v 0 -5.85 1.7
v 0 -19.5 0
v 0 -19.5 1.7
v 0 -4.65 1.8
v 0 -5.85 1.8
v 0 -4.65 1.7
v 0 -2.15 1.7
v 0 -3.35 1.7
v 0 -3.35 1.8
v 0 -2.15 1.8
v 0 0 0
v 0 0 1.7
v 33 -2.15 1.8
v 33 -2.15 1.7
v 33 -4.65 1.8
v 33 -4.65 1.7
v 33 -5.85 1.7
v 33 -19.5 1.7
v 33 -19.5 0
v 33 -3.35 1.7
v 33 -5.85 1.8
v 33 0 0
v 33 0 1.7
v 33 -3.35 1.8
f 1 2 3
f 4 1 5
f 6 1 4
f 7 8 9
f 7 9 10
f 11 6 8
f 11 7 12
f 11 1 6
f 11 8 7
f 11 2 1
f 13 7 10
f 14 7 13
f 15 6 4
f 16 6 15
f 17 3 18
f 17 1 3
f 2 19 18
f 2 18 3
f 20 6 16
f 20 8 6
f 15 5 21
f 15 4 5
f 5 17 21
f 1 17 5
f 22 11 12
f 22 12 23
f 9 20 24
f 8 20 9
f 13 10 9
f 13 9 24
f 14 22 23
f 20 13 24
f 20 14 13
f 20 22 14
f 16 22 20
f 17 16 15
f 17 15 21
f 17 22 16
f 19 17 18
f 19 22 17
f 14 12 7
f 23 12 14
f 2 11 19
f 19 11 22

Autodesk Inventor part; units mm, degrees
ref_plane "YZ Plane" through (0, 0, 0) normal (1, 0, 0) x (0, 1, 0)
ref_plane "XZ Plane" through (0, 0, 0) normal (0, 1, 0) x (-1, 0, 0)
ref_plane "XY Plane" through (0, 0, 0) normal (0, 0, 1) x (1, 0, 0)
sketch "Skizze1" plane through (0, 0, 0) normal (0, 0, 1) x (1, 0, 0)
  line L0 (0, 0) -> (33, 0)
  line L1 (33, 0) -> (33, -19.5)
  line L2 (33, -19.5) -> (0, -19.5)
  line L3 (0, -19.5) -> (0, 0)
  dimension "d0" = 33
  dimension "d1" = 19.5
extrude "Extrusion1" add sketch "Skizze1" along normal blind 1.7
sketch "Skizze2" plane through (0, 0, 1.7) normal (0, 0, 1) x (1, 0, 0)
  line L0 (33, 0) -> (0, 0) projected
  line L1 (0, 0) -> (0, -19.5) projected
  line L2 (0, -19.5) -> (33, -19.5) projected
  line L3 (33, -19.5) -> (33, 0) projected
  line L4 (0, 0) -> (0, -19.5) projected
  line L5 (33, 0) -> (33, -19.5) projected
  line L6 (0, -2.15) -> (33, -2.15)
  line L7 (33, -2.15) -> (33, -3.35)
  line L8 (33, -3.35) -> (0, -3.35)
  line L9 (0, -3.35) -> (0, -2.15)
  line L10 (33, -5.85) -> (0, -5.85)
  line L11 (0, -5.85) -> (0, -4.65)
  line L12 (0, -4.65) -> (33, -4.65)
  line L13 (33, -4.65) -> (33, -5.85)
  line L14 (0, -3.35) -> (33, -3.35)
  line L15 (33, -3.35) -> (33, -2.15)
  line L16 (33, -2.15) -> (0, -2.15)
  line L17 (0, -2.15) -> (0, -3.35)
  line L18 (33, -4.65) -> (0, -4.65)
  line L19 (0, -4.65) -> (0, -5.85)
  line L20 (0, -5.85) -> (33, -5.85)
  line L21 (33, -5.85) -> (33, -4.65)
  dimension "d10" = 1.2
  dimension "d11" = 1.2
  dimension "d12" = 1.3
extrude "Extrusion2" add sketch "Skizze2" along normal blind 0.1 contours L3 L8 L1 L6 | L3 L10 L1 L12
sketch "Skizze4" plane through (0, 0, 1.7) normal (0, 0, 1) x (1, 0, 0)
  line L0 (429, -5.85) -> (0, -5.85) projected
  line L1 (0, -5.85) -> (0, -20) projected
  line L2 (0, -20) -> (429, -20) projected
  line L3 (429, -20) -> (429, -5.85) projected
  line L4 (0, -20) -> (-50, -20)
  line L5 (-50, -20) -> (-50, 20)
  line L6 (-50, 20) -> (0, 20)
  line L7 (0, 20) -> (0, -20)
  line L8 (23.5, 20) -> (11.5, 20) projected
  point P0 (0, 0)
  dimension "d19" = 50
sketch "Skizze5" plane through (0, 0, 1.7) normal (0, 0, 1) x (1, 0, 0)
  circle A0 centre (50.5, 14) radius 1.5 projected
  circle A1 centre (83.5, 14) radius 1.5 projected
  circle A2 centre (116.5, 14) radius 1.5 projected
  circle A3 centre (149.5, 14) radius 1.5 projected
  circle A4 centre (182.5, 14) radius 1.5 projected
  circle A5 centre (215.5, 14) radius 1.5 projected
  circle A6 centre (248.5, 14) radius 1.5 projected
  circle A7 centre (281.5, 14) radius 1.5 projected
  circle A8 centre (314.5, 14) radius 1.5 projected
  circle A9 centre (347.5, 14) radius 1.5 projected
  circle A10 centre (380.5, 14) radius 1.5 projected
  circle A11 centre (413.5, 14) radius 1.5 projected
  circle A12 centre (17.5, 14) radius 1.5 projected
  line L0 (0, -2.15) -> (429, -2.15) projected
  line L1 (429, -2.15) -> (429, 0) projected
  line L2 (429, 0) -> (419.5, 0) projected
  line L3 (419.5, 0) -> (419.5, 20) projected
  line L4 (419.5, 20) -> (407.5, 20) projected
  line L5 (407.5, 20) -> (407.5, 0) projected
  line L6 (407.5, 0) -> (386.5, 0) projected
  line L7 (386.5, 0) -> (386.5, 20) projected
  line L8 (386.5, 20) -> (374.5, 20) projected
  line L9 (374.5, 20) -> (374.5, 0) projected
  line L10 (374.5, 0) -> (353.5, 0) projected
  line L11 (353.5, 0) -> (353.5, 20) projected
  line L12 (353.5, 20) -> (341.5, 20) projected
  line L13 (341.5, 20) -> (341.5, 0) projected
  line L14 (341.5, 0) -> (320.5, 0) projected
  line L15 (320.5, 0) -> (320.5, 20) projected
  line L16 (320.5, 20) -> (308.5, 20) projected
  line L17 (308.5, 20) -> (308.5, 0) projected
  line L18 (308.5, 0) -> (287.5, 0) projected
  line L19 (287.5, 0) -> (287.5, 20) projected
  line L20 (287.5, 20) -> (275.5, 20) projected
  line L21 (275.5, 20) -> (275.5, 0) projected
  line L22 (275.5, 0) -> (254.5, 0) projected
  line L23 (254.5, 0) -> (254.5, 20) projected
  line L24 (254.5, 20) -> (242.5, 20) projected
  line L25 (242.5, 20) -> (242.5, 0) projected
  line L26 (242.5, 0) -> (221.5, 0) projected
  line L27 (221.5, 0) -> (221.5, 20) projected
  line L28 (221.5, 20) -> (209.5, 20) projected
  line L29 (209.5, 20) -> (209.5, 0) projected
  line L30 (209.5, 0) -> (188.5, 0) projected
  line L31 (188.5, 0) -> (188.5, 20) projected
  line L32 (188.5, 20) -> (176.5, 20) projected
  line L33 (176.5, 20) -> (176.5, 0) projected
  line L34 (176.5, 0) -> (155.5, 0) projected
  line L35 (155.5, 0) -> (155.5, 20) projected
  line L36 (155.5, 20) -> (143.5, 20) projected
  line L37 (143.5, 20) -> (143.5, 0) projected
  line L38 (143.5, 0) -> (122.5, 0) projected
  line L39 (122.5, 0) -> (122.5, 20) projected
  line L40 (122.5, 20) -> (110.5, 20) projected
  line L41 (110.5, 20) -> (110.5, 0) projected
  line L42 (110.5, 0) -> (89.5, 0) projected
  line L43 (89.5, 0) -> (89.5, 20) projected
  line L44 (89.5, 20) -> (77.5, 20) projected
  line L45 (77.5, 20) -> (77.5, 0) projected
  line L46 (77.5, 0) -> (56.5, 0) projected
  line L47 (56.5, 0) -> (56.5, 20) projected
  line L48 (56.5, 20) -> (44.5, 20) projected
  line L49 (44.5, 20) -> (44.5, 0) projected
  line L50 (44.5, 0) -> (23.5, 0) projected
  line L51 (23.5, 0) -> (23.5, 20) projected
  line L52 (23.5, 20) -> (11.5, 20) projected
  line L53 (11.5, 20) -> (11.5, 0) projected
  line L54 (11.5, 0) -> (0, 0) projected
  line L55 (0, 0) -> (0, 20) projected
  line L56 (0, 20) -> (-50, 20) projected
  line L57 (-50, 20) -> (-50, -20) projected
  line L58 (-50, -20) -> (429, -20) projected
  line L59 (429, -20) -> (429, -5.85) projected
  line L60 (429, -5.85) -> (0, -5.85) projected
  line L61 (0, -4.65) -> (0, -5.85) projected
  line L62 (0, -4.65) -> (429, -4.65) projected
  line L63 (429, -4.65) -> (429, -3.35) projected
  line L64 (429, -3.35) -> (0, -3.35) projected
  line L65 (0, -2.15) -> (0, -3.35) projected
  line L66 (-38.9172, -16.707) -> (-48.9487, -16.707)
  line L67 (-48.9487, -16.707) -> (-48.9487, -8.753)
  line L68 (-48.9487, -8.753) -> (-38.9172, -8.753)
  line L69 (-38.9172, -8.753) -> (-38.9172, -16.707)
  line L70 (-40.6386, -6.9723) -> (-48.9487, -6.9723)
  line L71 (-48.9487, -6.9723) -> (-48.9487, -2.75)
  line L72 (-48.9487, -2.75) -> (-40.6386, -2.75)
  line L73 (-40.6386, -2.75) -> (-40.6386, -6.9723)
sketch "Skizze6" plane through (0, 0, 1.7) normal (0, 0, 1) x (1, 0, 0)
  circle A0 centre (-40.9672, 3.5952) radius 2
  point P0 (0, 0)
  dimension "d25" = 4
  dimension "d29" = 20
  dimension "d30" = 1.3
  dimension "d31" = 1.2
  dimension "d32" = 1.2
  dimension "d33" = 2.15
properties part number "PowerRail"
